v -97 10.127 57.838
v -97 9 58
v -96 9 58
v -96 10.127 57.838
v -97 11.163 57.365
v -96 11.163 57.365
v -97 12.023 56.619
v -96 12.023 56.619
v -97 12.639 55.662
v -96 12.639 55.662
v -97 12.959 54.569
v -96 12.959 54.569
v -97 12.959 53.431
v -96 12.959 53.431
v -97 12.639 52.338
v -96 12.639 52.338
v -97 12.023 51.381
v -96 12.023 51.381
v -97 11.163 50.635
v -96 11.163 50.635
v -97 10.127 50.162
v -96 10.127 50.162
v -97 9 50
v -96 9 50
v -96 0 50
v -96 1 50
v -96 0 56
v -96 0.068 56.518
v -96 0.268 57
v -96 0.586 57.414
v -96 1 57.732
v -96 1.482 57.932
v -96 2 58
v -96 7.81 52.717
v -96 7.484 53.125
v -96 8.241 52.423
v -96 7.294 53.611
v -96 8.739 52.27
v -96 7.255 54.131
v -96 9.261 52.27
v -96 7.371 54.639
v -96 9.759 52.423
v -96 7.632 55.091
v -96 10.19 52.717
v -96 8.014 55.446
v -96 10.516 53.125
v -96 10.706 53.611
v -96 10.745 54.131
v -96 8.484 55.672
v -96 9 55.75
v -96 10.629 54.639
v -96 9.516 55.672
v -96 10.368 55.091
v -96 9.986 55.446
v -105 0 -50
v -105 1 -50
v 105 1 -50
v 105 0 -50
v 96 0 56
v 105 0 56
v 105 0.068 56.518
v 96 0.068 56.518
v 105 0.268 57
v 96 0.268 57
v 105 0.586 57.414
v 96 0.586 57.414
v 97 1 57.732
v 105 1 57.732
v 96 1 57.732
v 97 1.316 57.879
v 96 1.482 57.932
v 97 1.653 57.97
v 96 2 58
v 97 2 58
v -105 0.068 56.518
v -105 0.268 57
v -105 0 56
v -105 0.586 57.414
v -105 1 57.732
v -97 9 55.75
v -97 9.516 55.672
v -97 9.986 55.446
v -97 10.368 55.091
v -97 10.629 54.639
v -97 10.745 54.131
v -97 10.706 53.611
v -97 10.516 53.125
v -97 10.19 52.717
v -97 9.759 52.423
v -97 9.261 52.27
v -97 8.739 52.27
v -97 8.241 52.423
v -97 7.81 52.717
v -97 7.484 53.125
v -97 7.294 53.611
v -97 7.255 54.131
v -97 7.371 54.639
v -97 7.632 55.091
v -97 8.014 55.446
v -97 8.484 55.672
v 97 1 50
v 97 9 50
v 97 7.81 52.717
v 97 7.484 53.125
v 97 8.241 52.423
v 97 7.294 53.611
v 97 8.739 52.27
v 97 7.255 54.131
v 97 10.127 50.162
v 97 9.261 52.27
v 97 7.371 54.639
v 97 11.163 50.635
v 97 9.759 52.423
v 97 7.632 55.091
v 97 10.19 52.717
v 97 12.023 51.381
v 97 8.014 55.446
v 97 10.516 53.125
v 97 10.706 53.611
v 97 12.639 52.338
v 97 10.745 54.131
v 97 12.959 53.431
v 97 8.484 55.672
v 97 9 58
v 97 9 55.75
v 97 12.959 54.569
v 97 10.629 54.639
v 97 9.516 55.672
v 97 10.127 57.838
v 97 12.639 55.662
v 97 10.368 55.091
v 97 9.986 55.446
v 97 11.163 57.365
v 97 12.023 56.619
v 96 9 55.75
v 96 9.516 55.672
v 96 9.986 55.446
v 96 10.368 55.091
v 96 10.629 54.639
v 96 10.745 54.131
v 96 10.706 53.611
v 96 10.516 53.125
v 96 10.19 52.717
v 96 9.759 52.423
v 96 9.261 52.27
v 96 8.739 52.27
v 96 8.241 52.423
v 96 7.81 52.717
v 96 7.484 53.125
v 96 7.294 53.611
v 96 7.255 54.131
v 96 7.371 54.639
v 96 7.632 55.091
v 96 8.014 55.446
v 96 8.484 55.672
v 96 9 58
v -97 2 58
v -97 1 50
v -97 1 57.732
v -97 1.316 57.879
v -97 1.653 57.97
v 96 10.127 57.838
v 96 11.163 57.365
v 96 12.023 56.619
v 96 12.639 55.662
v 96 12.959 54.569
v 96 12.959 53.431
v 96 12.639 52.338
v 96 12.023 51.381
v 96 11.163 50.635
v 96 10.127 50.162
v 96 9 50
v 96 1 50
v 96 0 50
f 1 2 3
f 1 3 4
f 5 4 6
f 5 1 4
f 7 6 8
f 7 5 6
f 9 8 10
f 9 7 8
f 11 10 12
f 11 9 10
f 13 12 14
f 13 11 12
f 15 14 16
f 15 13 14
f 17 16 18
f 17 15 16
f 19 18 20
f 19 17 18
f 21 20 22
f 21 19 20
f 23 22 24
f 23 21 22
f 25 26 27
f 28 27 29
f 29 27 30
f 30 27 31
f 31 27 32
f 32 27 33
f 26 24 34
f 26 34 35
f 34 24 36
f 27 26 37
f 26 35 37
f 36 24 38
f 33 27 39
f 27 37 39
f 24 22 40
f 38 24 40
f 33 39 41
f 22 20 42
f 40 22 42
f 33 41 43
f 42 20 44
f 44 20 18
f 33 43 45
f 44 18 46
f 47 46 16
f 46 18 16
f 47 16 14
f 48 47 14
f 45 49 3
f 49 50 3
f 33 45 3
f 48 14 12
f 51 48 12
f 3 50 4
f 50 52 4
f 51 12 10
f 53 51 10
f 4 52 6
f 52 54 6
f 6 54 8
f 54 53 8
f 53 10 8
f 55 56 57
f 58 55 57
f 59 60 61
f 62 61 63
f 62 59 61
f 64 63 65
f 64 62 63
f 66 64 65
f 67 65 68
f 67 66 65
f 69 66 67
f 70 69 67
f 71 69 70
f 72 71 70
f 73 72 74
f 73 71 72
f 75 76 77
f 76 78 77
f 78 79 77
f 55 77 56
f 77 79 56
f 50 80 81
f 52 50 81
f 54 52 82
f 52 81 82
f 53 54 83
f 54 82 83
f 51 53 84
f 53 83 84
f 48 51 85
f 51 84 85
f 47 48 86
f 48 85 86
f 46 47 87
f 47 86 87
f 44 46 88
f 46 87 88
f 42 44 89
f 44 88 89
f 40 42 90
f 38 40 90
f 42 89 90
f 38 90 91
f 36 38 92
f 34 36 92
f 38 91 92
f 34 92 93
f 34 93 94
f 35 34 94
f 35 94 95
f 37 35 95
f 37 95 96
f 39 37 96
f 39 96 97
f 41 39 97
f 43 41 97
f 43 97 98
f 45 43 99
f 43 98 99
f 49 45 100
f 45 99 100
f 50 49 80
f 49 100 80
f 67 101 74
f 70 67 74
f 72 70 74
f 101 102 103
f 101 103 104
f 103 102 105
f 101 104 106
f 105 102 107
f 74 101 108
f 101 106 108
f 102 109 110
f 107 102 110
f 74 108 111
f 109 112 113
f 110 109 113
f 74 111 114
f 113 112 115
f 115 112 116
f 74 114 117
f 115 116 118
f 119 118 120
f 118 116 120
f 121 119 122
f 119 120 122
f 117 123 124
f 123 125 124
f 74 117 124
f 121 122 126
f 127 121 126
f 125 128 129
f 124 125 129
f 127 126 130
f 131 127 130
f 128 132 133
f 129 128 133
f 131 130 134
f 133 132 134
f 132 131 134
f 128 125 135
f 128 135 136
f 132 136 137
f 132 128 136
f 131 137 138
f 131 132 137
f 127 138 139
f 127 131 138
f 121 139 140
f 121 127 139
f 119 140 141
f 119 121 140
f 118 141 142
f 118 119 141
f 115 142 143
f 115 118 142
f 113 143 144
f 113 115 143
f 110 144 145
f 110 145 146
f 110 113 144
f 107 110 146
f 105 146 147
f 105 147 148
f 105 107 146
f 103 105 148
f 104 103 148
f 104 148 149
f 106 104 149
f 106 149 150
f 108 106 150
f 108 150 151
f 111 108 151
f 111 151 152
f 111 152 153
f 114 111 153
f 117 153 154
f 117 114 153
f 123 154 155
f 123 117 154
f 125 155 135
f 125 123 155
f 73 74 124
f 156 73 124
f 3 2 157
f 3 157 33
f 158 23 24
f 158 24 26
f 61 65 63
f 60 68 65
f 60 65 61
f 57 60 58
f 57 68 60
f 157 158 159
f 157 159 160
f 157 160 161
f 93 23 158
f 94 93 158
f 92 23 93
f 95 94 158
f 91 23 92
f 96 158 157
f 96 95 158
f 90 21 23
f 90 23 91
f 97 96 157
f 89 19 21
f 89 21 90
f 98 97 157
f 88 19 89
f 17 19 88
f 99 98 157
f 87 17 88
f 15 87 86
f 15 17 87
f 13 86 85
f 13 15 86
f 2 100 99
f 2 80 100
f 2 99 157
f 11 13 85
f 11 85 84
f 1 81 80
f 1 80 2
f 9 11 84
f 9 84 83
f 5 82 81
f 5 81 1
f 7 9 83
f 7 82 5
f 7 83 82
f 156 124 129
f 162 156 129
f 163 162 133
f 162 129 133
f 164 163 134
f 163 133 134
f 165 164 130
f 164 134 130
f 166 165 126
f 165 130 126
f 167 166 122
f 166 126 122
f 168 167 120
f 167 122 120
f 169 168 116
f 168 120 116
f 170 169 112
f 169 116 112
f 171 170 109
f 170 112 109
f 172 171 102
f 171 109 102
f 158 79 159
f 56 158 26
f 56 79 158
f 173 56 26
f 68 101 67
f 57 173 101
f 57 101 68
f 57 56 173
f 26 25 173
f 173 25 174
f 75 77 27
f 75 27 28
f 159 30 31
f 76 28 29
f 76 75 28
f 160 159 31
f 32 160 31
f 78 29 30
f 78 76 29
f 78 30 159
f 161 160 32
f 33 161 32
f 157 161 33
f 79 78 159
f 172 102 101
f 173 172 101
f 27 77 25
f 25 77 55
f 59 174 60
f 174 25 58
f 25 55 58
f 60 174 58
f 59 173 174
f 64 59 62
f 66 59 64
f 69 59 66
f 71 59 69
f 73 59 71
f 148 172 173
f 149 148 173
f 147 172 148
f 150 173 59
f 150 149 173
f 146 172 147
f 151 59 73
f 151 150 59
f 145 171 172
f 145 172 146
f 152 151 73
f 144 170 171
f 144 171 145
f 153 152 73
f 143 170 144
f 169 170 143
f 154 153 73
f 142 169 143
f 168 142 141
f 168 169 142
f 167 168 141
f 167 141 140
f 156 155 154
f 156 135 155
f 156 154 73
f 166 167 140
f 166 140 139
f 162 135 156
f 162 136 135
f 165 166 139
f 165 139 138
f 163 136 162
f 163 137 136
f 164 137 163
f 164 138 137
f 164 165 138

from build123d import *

# Parameters (mm, degrees)
SKETCH1_W           = 194
SKETCH1_H           = 100
BOSS_EXTRUDE1_DEPTH = 1
SKETCH2_R           = 1.75
BOSS_EXTRUDE2_DEPTH = 1
SKETCH5_W           = 8
SKETCH5_H           = 108
BOSS_EXTRUDE3_DEPTH = 1
CUT_EXTRUDE3_DEPTH  = 219.249856816


with BuildPart() as part:
    # Sketch1 → Boss-Extrude1 (new body)
    with BuildSketch(Plane(origin=(0, 0, 0), x_dir=(1, 0, 0), z_dir=(0, 1, 0))):
        Rectangle(SKETCH1_W, SKETCH1_H)
    extrude(amount=BOSS_EXTRUDE1_DEPTH)

    # Sketch2 → Boss-Extrude2 (add)
    with BuildSketch(Plane.ZY.offset(97)):
        with BuildLine():
            Line((58, 0), (58, 9))
            ThreePointArc((58, 9), (54, 13), (50, 9))
            Line((50, 9), (50, 0))
            Line((50, 0), (58, 0))
        make_face()
        with Locations((54, 9)):
            Circle(SKETCH2_R, mode=Mode.SUBTRACT)
    boss_extrude2 = extrude(amount=-BOSS_EXTRUDE2_DEPTH)

    # Mirror1: Boss-Extrude2 across plane
    add(boss_extrude2.mirror(Plane.ZY))

    # Sketch5 → Boss-Extrude3 (add)
    with BuildSketch(Plane(origin=(0, 1, 0), x_dir=(1, 0, 0), z_dir=(0, 1, 0))):
        with Locations((-101, -4)):
            Rectangle(SKETCH5_W, SKETCH5_H)
        with Locations((101, -4)):
            Rectangle(SKETCH5_W, SKETCH5_H)
    extrude(amount=-BOSS_EXTRUDE3_DEPTH)

    # Sketch6 → Cut-Extrude3 (cut, through all)
    with BuildSketch(Plane.ZY.offset(105)):
        with BuildLine():
            Line((58, 0), (56, 0))
            ThreePointArc((56, 0), (57.414213562, 0.585786438), (58, 2))
            Line((58, 2), (58, 0))
        make_face()
    extrude(amount=-CUT_EXTRUDE3_DEPTH, mode=Mode.SUBTRACT)


solid = part.part
